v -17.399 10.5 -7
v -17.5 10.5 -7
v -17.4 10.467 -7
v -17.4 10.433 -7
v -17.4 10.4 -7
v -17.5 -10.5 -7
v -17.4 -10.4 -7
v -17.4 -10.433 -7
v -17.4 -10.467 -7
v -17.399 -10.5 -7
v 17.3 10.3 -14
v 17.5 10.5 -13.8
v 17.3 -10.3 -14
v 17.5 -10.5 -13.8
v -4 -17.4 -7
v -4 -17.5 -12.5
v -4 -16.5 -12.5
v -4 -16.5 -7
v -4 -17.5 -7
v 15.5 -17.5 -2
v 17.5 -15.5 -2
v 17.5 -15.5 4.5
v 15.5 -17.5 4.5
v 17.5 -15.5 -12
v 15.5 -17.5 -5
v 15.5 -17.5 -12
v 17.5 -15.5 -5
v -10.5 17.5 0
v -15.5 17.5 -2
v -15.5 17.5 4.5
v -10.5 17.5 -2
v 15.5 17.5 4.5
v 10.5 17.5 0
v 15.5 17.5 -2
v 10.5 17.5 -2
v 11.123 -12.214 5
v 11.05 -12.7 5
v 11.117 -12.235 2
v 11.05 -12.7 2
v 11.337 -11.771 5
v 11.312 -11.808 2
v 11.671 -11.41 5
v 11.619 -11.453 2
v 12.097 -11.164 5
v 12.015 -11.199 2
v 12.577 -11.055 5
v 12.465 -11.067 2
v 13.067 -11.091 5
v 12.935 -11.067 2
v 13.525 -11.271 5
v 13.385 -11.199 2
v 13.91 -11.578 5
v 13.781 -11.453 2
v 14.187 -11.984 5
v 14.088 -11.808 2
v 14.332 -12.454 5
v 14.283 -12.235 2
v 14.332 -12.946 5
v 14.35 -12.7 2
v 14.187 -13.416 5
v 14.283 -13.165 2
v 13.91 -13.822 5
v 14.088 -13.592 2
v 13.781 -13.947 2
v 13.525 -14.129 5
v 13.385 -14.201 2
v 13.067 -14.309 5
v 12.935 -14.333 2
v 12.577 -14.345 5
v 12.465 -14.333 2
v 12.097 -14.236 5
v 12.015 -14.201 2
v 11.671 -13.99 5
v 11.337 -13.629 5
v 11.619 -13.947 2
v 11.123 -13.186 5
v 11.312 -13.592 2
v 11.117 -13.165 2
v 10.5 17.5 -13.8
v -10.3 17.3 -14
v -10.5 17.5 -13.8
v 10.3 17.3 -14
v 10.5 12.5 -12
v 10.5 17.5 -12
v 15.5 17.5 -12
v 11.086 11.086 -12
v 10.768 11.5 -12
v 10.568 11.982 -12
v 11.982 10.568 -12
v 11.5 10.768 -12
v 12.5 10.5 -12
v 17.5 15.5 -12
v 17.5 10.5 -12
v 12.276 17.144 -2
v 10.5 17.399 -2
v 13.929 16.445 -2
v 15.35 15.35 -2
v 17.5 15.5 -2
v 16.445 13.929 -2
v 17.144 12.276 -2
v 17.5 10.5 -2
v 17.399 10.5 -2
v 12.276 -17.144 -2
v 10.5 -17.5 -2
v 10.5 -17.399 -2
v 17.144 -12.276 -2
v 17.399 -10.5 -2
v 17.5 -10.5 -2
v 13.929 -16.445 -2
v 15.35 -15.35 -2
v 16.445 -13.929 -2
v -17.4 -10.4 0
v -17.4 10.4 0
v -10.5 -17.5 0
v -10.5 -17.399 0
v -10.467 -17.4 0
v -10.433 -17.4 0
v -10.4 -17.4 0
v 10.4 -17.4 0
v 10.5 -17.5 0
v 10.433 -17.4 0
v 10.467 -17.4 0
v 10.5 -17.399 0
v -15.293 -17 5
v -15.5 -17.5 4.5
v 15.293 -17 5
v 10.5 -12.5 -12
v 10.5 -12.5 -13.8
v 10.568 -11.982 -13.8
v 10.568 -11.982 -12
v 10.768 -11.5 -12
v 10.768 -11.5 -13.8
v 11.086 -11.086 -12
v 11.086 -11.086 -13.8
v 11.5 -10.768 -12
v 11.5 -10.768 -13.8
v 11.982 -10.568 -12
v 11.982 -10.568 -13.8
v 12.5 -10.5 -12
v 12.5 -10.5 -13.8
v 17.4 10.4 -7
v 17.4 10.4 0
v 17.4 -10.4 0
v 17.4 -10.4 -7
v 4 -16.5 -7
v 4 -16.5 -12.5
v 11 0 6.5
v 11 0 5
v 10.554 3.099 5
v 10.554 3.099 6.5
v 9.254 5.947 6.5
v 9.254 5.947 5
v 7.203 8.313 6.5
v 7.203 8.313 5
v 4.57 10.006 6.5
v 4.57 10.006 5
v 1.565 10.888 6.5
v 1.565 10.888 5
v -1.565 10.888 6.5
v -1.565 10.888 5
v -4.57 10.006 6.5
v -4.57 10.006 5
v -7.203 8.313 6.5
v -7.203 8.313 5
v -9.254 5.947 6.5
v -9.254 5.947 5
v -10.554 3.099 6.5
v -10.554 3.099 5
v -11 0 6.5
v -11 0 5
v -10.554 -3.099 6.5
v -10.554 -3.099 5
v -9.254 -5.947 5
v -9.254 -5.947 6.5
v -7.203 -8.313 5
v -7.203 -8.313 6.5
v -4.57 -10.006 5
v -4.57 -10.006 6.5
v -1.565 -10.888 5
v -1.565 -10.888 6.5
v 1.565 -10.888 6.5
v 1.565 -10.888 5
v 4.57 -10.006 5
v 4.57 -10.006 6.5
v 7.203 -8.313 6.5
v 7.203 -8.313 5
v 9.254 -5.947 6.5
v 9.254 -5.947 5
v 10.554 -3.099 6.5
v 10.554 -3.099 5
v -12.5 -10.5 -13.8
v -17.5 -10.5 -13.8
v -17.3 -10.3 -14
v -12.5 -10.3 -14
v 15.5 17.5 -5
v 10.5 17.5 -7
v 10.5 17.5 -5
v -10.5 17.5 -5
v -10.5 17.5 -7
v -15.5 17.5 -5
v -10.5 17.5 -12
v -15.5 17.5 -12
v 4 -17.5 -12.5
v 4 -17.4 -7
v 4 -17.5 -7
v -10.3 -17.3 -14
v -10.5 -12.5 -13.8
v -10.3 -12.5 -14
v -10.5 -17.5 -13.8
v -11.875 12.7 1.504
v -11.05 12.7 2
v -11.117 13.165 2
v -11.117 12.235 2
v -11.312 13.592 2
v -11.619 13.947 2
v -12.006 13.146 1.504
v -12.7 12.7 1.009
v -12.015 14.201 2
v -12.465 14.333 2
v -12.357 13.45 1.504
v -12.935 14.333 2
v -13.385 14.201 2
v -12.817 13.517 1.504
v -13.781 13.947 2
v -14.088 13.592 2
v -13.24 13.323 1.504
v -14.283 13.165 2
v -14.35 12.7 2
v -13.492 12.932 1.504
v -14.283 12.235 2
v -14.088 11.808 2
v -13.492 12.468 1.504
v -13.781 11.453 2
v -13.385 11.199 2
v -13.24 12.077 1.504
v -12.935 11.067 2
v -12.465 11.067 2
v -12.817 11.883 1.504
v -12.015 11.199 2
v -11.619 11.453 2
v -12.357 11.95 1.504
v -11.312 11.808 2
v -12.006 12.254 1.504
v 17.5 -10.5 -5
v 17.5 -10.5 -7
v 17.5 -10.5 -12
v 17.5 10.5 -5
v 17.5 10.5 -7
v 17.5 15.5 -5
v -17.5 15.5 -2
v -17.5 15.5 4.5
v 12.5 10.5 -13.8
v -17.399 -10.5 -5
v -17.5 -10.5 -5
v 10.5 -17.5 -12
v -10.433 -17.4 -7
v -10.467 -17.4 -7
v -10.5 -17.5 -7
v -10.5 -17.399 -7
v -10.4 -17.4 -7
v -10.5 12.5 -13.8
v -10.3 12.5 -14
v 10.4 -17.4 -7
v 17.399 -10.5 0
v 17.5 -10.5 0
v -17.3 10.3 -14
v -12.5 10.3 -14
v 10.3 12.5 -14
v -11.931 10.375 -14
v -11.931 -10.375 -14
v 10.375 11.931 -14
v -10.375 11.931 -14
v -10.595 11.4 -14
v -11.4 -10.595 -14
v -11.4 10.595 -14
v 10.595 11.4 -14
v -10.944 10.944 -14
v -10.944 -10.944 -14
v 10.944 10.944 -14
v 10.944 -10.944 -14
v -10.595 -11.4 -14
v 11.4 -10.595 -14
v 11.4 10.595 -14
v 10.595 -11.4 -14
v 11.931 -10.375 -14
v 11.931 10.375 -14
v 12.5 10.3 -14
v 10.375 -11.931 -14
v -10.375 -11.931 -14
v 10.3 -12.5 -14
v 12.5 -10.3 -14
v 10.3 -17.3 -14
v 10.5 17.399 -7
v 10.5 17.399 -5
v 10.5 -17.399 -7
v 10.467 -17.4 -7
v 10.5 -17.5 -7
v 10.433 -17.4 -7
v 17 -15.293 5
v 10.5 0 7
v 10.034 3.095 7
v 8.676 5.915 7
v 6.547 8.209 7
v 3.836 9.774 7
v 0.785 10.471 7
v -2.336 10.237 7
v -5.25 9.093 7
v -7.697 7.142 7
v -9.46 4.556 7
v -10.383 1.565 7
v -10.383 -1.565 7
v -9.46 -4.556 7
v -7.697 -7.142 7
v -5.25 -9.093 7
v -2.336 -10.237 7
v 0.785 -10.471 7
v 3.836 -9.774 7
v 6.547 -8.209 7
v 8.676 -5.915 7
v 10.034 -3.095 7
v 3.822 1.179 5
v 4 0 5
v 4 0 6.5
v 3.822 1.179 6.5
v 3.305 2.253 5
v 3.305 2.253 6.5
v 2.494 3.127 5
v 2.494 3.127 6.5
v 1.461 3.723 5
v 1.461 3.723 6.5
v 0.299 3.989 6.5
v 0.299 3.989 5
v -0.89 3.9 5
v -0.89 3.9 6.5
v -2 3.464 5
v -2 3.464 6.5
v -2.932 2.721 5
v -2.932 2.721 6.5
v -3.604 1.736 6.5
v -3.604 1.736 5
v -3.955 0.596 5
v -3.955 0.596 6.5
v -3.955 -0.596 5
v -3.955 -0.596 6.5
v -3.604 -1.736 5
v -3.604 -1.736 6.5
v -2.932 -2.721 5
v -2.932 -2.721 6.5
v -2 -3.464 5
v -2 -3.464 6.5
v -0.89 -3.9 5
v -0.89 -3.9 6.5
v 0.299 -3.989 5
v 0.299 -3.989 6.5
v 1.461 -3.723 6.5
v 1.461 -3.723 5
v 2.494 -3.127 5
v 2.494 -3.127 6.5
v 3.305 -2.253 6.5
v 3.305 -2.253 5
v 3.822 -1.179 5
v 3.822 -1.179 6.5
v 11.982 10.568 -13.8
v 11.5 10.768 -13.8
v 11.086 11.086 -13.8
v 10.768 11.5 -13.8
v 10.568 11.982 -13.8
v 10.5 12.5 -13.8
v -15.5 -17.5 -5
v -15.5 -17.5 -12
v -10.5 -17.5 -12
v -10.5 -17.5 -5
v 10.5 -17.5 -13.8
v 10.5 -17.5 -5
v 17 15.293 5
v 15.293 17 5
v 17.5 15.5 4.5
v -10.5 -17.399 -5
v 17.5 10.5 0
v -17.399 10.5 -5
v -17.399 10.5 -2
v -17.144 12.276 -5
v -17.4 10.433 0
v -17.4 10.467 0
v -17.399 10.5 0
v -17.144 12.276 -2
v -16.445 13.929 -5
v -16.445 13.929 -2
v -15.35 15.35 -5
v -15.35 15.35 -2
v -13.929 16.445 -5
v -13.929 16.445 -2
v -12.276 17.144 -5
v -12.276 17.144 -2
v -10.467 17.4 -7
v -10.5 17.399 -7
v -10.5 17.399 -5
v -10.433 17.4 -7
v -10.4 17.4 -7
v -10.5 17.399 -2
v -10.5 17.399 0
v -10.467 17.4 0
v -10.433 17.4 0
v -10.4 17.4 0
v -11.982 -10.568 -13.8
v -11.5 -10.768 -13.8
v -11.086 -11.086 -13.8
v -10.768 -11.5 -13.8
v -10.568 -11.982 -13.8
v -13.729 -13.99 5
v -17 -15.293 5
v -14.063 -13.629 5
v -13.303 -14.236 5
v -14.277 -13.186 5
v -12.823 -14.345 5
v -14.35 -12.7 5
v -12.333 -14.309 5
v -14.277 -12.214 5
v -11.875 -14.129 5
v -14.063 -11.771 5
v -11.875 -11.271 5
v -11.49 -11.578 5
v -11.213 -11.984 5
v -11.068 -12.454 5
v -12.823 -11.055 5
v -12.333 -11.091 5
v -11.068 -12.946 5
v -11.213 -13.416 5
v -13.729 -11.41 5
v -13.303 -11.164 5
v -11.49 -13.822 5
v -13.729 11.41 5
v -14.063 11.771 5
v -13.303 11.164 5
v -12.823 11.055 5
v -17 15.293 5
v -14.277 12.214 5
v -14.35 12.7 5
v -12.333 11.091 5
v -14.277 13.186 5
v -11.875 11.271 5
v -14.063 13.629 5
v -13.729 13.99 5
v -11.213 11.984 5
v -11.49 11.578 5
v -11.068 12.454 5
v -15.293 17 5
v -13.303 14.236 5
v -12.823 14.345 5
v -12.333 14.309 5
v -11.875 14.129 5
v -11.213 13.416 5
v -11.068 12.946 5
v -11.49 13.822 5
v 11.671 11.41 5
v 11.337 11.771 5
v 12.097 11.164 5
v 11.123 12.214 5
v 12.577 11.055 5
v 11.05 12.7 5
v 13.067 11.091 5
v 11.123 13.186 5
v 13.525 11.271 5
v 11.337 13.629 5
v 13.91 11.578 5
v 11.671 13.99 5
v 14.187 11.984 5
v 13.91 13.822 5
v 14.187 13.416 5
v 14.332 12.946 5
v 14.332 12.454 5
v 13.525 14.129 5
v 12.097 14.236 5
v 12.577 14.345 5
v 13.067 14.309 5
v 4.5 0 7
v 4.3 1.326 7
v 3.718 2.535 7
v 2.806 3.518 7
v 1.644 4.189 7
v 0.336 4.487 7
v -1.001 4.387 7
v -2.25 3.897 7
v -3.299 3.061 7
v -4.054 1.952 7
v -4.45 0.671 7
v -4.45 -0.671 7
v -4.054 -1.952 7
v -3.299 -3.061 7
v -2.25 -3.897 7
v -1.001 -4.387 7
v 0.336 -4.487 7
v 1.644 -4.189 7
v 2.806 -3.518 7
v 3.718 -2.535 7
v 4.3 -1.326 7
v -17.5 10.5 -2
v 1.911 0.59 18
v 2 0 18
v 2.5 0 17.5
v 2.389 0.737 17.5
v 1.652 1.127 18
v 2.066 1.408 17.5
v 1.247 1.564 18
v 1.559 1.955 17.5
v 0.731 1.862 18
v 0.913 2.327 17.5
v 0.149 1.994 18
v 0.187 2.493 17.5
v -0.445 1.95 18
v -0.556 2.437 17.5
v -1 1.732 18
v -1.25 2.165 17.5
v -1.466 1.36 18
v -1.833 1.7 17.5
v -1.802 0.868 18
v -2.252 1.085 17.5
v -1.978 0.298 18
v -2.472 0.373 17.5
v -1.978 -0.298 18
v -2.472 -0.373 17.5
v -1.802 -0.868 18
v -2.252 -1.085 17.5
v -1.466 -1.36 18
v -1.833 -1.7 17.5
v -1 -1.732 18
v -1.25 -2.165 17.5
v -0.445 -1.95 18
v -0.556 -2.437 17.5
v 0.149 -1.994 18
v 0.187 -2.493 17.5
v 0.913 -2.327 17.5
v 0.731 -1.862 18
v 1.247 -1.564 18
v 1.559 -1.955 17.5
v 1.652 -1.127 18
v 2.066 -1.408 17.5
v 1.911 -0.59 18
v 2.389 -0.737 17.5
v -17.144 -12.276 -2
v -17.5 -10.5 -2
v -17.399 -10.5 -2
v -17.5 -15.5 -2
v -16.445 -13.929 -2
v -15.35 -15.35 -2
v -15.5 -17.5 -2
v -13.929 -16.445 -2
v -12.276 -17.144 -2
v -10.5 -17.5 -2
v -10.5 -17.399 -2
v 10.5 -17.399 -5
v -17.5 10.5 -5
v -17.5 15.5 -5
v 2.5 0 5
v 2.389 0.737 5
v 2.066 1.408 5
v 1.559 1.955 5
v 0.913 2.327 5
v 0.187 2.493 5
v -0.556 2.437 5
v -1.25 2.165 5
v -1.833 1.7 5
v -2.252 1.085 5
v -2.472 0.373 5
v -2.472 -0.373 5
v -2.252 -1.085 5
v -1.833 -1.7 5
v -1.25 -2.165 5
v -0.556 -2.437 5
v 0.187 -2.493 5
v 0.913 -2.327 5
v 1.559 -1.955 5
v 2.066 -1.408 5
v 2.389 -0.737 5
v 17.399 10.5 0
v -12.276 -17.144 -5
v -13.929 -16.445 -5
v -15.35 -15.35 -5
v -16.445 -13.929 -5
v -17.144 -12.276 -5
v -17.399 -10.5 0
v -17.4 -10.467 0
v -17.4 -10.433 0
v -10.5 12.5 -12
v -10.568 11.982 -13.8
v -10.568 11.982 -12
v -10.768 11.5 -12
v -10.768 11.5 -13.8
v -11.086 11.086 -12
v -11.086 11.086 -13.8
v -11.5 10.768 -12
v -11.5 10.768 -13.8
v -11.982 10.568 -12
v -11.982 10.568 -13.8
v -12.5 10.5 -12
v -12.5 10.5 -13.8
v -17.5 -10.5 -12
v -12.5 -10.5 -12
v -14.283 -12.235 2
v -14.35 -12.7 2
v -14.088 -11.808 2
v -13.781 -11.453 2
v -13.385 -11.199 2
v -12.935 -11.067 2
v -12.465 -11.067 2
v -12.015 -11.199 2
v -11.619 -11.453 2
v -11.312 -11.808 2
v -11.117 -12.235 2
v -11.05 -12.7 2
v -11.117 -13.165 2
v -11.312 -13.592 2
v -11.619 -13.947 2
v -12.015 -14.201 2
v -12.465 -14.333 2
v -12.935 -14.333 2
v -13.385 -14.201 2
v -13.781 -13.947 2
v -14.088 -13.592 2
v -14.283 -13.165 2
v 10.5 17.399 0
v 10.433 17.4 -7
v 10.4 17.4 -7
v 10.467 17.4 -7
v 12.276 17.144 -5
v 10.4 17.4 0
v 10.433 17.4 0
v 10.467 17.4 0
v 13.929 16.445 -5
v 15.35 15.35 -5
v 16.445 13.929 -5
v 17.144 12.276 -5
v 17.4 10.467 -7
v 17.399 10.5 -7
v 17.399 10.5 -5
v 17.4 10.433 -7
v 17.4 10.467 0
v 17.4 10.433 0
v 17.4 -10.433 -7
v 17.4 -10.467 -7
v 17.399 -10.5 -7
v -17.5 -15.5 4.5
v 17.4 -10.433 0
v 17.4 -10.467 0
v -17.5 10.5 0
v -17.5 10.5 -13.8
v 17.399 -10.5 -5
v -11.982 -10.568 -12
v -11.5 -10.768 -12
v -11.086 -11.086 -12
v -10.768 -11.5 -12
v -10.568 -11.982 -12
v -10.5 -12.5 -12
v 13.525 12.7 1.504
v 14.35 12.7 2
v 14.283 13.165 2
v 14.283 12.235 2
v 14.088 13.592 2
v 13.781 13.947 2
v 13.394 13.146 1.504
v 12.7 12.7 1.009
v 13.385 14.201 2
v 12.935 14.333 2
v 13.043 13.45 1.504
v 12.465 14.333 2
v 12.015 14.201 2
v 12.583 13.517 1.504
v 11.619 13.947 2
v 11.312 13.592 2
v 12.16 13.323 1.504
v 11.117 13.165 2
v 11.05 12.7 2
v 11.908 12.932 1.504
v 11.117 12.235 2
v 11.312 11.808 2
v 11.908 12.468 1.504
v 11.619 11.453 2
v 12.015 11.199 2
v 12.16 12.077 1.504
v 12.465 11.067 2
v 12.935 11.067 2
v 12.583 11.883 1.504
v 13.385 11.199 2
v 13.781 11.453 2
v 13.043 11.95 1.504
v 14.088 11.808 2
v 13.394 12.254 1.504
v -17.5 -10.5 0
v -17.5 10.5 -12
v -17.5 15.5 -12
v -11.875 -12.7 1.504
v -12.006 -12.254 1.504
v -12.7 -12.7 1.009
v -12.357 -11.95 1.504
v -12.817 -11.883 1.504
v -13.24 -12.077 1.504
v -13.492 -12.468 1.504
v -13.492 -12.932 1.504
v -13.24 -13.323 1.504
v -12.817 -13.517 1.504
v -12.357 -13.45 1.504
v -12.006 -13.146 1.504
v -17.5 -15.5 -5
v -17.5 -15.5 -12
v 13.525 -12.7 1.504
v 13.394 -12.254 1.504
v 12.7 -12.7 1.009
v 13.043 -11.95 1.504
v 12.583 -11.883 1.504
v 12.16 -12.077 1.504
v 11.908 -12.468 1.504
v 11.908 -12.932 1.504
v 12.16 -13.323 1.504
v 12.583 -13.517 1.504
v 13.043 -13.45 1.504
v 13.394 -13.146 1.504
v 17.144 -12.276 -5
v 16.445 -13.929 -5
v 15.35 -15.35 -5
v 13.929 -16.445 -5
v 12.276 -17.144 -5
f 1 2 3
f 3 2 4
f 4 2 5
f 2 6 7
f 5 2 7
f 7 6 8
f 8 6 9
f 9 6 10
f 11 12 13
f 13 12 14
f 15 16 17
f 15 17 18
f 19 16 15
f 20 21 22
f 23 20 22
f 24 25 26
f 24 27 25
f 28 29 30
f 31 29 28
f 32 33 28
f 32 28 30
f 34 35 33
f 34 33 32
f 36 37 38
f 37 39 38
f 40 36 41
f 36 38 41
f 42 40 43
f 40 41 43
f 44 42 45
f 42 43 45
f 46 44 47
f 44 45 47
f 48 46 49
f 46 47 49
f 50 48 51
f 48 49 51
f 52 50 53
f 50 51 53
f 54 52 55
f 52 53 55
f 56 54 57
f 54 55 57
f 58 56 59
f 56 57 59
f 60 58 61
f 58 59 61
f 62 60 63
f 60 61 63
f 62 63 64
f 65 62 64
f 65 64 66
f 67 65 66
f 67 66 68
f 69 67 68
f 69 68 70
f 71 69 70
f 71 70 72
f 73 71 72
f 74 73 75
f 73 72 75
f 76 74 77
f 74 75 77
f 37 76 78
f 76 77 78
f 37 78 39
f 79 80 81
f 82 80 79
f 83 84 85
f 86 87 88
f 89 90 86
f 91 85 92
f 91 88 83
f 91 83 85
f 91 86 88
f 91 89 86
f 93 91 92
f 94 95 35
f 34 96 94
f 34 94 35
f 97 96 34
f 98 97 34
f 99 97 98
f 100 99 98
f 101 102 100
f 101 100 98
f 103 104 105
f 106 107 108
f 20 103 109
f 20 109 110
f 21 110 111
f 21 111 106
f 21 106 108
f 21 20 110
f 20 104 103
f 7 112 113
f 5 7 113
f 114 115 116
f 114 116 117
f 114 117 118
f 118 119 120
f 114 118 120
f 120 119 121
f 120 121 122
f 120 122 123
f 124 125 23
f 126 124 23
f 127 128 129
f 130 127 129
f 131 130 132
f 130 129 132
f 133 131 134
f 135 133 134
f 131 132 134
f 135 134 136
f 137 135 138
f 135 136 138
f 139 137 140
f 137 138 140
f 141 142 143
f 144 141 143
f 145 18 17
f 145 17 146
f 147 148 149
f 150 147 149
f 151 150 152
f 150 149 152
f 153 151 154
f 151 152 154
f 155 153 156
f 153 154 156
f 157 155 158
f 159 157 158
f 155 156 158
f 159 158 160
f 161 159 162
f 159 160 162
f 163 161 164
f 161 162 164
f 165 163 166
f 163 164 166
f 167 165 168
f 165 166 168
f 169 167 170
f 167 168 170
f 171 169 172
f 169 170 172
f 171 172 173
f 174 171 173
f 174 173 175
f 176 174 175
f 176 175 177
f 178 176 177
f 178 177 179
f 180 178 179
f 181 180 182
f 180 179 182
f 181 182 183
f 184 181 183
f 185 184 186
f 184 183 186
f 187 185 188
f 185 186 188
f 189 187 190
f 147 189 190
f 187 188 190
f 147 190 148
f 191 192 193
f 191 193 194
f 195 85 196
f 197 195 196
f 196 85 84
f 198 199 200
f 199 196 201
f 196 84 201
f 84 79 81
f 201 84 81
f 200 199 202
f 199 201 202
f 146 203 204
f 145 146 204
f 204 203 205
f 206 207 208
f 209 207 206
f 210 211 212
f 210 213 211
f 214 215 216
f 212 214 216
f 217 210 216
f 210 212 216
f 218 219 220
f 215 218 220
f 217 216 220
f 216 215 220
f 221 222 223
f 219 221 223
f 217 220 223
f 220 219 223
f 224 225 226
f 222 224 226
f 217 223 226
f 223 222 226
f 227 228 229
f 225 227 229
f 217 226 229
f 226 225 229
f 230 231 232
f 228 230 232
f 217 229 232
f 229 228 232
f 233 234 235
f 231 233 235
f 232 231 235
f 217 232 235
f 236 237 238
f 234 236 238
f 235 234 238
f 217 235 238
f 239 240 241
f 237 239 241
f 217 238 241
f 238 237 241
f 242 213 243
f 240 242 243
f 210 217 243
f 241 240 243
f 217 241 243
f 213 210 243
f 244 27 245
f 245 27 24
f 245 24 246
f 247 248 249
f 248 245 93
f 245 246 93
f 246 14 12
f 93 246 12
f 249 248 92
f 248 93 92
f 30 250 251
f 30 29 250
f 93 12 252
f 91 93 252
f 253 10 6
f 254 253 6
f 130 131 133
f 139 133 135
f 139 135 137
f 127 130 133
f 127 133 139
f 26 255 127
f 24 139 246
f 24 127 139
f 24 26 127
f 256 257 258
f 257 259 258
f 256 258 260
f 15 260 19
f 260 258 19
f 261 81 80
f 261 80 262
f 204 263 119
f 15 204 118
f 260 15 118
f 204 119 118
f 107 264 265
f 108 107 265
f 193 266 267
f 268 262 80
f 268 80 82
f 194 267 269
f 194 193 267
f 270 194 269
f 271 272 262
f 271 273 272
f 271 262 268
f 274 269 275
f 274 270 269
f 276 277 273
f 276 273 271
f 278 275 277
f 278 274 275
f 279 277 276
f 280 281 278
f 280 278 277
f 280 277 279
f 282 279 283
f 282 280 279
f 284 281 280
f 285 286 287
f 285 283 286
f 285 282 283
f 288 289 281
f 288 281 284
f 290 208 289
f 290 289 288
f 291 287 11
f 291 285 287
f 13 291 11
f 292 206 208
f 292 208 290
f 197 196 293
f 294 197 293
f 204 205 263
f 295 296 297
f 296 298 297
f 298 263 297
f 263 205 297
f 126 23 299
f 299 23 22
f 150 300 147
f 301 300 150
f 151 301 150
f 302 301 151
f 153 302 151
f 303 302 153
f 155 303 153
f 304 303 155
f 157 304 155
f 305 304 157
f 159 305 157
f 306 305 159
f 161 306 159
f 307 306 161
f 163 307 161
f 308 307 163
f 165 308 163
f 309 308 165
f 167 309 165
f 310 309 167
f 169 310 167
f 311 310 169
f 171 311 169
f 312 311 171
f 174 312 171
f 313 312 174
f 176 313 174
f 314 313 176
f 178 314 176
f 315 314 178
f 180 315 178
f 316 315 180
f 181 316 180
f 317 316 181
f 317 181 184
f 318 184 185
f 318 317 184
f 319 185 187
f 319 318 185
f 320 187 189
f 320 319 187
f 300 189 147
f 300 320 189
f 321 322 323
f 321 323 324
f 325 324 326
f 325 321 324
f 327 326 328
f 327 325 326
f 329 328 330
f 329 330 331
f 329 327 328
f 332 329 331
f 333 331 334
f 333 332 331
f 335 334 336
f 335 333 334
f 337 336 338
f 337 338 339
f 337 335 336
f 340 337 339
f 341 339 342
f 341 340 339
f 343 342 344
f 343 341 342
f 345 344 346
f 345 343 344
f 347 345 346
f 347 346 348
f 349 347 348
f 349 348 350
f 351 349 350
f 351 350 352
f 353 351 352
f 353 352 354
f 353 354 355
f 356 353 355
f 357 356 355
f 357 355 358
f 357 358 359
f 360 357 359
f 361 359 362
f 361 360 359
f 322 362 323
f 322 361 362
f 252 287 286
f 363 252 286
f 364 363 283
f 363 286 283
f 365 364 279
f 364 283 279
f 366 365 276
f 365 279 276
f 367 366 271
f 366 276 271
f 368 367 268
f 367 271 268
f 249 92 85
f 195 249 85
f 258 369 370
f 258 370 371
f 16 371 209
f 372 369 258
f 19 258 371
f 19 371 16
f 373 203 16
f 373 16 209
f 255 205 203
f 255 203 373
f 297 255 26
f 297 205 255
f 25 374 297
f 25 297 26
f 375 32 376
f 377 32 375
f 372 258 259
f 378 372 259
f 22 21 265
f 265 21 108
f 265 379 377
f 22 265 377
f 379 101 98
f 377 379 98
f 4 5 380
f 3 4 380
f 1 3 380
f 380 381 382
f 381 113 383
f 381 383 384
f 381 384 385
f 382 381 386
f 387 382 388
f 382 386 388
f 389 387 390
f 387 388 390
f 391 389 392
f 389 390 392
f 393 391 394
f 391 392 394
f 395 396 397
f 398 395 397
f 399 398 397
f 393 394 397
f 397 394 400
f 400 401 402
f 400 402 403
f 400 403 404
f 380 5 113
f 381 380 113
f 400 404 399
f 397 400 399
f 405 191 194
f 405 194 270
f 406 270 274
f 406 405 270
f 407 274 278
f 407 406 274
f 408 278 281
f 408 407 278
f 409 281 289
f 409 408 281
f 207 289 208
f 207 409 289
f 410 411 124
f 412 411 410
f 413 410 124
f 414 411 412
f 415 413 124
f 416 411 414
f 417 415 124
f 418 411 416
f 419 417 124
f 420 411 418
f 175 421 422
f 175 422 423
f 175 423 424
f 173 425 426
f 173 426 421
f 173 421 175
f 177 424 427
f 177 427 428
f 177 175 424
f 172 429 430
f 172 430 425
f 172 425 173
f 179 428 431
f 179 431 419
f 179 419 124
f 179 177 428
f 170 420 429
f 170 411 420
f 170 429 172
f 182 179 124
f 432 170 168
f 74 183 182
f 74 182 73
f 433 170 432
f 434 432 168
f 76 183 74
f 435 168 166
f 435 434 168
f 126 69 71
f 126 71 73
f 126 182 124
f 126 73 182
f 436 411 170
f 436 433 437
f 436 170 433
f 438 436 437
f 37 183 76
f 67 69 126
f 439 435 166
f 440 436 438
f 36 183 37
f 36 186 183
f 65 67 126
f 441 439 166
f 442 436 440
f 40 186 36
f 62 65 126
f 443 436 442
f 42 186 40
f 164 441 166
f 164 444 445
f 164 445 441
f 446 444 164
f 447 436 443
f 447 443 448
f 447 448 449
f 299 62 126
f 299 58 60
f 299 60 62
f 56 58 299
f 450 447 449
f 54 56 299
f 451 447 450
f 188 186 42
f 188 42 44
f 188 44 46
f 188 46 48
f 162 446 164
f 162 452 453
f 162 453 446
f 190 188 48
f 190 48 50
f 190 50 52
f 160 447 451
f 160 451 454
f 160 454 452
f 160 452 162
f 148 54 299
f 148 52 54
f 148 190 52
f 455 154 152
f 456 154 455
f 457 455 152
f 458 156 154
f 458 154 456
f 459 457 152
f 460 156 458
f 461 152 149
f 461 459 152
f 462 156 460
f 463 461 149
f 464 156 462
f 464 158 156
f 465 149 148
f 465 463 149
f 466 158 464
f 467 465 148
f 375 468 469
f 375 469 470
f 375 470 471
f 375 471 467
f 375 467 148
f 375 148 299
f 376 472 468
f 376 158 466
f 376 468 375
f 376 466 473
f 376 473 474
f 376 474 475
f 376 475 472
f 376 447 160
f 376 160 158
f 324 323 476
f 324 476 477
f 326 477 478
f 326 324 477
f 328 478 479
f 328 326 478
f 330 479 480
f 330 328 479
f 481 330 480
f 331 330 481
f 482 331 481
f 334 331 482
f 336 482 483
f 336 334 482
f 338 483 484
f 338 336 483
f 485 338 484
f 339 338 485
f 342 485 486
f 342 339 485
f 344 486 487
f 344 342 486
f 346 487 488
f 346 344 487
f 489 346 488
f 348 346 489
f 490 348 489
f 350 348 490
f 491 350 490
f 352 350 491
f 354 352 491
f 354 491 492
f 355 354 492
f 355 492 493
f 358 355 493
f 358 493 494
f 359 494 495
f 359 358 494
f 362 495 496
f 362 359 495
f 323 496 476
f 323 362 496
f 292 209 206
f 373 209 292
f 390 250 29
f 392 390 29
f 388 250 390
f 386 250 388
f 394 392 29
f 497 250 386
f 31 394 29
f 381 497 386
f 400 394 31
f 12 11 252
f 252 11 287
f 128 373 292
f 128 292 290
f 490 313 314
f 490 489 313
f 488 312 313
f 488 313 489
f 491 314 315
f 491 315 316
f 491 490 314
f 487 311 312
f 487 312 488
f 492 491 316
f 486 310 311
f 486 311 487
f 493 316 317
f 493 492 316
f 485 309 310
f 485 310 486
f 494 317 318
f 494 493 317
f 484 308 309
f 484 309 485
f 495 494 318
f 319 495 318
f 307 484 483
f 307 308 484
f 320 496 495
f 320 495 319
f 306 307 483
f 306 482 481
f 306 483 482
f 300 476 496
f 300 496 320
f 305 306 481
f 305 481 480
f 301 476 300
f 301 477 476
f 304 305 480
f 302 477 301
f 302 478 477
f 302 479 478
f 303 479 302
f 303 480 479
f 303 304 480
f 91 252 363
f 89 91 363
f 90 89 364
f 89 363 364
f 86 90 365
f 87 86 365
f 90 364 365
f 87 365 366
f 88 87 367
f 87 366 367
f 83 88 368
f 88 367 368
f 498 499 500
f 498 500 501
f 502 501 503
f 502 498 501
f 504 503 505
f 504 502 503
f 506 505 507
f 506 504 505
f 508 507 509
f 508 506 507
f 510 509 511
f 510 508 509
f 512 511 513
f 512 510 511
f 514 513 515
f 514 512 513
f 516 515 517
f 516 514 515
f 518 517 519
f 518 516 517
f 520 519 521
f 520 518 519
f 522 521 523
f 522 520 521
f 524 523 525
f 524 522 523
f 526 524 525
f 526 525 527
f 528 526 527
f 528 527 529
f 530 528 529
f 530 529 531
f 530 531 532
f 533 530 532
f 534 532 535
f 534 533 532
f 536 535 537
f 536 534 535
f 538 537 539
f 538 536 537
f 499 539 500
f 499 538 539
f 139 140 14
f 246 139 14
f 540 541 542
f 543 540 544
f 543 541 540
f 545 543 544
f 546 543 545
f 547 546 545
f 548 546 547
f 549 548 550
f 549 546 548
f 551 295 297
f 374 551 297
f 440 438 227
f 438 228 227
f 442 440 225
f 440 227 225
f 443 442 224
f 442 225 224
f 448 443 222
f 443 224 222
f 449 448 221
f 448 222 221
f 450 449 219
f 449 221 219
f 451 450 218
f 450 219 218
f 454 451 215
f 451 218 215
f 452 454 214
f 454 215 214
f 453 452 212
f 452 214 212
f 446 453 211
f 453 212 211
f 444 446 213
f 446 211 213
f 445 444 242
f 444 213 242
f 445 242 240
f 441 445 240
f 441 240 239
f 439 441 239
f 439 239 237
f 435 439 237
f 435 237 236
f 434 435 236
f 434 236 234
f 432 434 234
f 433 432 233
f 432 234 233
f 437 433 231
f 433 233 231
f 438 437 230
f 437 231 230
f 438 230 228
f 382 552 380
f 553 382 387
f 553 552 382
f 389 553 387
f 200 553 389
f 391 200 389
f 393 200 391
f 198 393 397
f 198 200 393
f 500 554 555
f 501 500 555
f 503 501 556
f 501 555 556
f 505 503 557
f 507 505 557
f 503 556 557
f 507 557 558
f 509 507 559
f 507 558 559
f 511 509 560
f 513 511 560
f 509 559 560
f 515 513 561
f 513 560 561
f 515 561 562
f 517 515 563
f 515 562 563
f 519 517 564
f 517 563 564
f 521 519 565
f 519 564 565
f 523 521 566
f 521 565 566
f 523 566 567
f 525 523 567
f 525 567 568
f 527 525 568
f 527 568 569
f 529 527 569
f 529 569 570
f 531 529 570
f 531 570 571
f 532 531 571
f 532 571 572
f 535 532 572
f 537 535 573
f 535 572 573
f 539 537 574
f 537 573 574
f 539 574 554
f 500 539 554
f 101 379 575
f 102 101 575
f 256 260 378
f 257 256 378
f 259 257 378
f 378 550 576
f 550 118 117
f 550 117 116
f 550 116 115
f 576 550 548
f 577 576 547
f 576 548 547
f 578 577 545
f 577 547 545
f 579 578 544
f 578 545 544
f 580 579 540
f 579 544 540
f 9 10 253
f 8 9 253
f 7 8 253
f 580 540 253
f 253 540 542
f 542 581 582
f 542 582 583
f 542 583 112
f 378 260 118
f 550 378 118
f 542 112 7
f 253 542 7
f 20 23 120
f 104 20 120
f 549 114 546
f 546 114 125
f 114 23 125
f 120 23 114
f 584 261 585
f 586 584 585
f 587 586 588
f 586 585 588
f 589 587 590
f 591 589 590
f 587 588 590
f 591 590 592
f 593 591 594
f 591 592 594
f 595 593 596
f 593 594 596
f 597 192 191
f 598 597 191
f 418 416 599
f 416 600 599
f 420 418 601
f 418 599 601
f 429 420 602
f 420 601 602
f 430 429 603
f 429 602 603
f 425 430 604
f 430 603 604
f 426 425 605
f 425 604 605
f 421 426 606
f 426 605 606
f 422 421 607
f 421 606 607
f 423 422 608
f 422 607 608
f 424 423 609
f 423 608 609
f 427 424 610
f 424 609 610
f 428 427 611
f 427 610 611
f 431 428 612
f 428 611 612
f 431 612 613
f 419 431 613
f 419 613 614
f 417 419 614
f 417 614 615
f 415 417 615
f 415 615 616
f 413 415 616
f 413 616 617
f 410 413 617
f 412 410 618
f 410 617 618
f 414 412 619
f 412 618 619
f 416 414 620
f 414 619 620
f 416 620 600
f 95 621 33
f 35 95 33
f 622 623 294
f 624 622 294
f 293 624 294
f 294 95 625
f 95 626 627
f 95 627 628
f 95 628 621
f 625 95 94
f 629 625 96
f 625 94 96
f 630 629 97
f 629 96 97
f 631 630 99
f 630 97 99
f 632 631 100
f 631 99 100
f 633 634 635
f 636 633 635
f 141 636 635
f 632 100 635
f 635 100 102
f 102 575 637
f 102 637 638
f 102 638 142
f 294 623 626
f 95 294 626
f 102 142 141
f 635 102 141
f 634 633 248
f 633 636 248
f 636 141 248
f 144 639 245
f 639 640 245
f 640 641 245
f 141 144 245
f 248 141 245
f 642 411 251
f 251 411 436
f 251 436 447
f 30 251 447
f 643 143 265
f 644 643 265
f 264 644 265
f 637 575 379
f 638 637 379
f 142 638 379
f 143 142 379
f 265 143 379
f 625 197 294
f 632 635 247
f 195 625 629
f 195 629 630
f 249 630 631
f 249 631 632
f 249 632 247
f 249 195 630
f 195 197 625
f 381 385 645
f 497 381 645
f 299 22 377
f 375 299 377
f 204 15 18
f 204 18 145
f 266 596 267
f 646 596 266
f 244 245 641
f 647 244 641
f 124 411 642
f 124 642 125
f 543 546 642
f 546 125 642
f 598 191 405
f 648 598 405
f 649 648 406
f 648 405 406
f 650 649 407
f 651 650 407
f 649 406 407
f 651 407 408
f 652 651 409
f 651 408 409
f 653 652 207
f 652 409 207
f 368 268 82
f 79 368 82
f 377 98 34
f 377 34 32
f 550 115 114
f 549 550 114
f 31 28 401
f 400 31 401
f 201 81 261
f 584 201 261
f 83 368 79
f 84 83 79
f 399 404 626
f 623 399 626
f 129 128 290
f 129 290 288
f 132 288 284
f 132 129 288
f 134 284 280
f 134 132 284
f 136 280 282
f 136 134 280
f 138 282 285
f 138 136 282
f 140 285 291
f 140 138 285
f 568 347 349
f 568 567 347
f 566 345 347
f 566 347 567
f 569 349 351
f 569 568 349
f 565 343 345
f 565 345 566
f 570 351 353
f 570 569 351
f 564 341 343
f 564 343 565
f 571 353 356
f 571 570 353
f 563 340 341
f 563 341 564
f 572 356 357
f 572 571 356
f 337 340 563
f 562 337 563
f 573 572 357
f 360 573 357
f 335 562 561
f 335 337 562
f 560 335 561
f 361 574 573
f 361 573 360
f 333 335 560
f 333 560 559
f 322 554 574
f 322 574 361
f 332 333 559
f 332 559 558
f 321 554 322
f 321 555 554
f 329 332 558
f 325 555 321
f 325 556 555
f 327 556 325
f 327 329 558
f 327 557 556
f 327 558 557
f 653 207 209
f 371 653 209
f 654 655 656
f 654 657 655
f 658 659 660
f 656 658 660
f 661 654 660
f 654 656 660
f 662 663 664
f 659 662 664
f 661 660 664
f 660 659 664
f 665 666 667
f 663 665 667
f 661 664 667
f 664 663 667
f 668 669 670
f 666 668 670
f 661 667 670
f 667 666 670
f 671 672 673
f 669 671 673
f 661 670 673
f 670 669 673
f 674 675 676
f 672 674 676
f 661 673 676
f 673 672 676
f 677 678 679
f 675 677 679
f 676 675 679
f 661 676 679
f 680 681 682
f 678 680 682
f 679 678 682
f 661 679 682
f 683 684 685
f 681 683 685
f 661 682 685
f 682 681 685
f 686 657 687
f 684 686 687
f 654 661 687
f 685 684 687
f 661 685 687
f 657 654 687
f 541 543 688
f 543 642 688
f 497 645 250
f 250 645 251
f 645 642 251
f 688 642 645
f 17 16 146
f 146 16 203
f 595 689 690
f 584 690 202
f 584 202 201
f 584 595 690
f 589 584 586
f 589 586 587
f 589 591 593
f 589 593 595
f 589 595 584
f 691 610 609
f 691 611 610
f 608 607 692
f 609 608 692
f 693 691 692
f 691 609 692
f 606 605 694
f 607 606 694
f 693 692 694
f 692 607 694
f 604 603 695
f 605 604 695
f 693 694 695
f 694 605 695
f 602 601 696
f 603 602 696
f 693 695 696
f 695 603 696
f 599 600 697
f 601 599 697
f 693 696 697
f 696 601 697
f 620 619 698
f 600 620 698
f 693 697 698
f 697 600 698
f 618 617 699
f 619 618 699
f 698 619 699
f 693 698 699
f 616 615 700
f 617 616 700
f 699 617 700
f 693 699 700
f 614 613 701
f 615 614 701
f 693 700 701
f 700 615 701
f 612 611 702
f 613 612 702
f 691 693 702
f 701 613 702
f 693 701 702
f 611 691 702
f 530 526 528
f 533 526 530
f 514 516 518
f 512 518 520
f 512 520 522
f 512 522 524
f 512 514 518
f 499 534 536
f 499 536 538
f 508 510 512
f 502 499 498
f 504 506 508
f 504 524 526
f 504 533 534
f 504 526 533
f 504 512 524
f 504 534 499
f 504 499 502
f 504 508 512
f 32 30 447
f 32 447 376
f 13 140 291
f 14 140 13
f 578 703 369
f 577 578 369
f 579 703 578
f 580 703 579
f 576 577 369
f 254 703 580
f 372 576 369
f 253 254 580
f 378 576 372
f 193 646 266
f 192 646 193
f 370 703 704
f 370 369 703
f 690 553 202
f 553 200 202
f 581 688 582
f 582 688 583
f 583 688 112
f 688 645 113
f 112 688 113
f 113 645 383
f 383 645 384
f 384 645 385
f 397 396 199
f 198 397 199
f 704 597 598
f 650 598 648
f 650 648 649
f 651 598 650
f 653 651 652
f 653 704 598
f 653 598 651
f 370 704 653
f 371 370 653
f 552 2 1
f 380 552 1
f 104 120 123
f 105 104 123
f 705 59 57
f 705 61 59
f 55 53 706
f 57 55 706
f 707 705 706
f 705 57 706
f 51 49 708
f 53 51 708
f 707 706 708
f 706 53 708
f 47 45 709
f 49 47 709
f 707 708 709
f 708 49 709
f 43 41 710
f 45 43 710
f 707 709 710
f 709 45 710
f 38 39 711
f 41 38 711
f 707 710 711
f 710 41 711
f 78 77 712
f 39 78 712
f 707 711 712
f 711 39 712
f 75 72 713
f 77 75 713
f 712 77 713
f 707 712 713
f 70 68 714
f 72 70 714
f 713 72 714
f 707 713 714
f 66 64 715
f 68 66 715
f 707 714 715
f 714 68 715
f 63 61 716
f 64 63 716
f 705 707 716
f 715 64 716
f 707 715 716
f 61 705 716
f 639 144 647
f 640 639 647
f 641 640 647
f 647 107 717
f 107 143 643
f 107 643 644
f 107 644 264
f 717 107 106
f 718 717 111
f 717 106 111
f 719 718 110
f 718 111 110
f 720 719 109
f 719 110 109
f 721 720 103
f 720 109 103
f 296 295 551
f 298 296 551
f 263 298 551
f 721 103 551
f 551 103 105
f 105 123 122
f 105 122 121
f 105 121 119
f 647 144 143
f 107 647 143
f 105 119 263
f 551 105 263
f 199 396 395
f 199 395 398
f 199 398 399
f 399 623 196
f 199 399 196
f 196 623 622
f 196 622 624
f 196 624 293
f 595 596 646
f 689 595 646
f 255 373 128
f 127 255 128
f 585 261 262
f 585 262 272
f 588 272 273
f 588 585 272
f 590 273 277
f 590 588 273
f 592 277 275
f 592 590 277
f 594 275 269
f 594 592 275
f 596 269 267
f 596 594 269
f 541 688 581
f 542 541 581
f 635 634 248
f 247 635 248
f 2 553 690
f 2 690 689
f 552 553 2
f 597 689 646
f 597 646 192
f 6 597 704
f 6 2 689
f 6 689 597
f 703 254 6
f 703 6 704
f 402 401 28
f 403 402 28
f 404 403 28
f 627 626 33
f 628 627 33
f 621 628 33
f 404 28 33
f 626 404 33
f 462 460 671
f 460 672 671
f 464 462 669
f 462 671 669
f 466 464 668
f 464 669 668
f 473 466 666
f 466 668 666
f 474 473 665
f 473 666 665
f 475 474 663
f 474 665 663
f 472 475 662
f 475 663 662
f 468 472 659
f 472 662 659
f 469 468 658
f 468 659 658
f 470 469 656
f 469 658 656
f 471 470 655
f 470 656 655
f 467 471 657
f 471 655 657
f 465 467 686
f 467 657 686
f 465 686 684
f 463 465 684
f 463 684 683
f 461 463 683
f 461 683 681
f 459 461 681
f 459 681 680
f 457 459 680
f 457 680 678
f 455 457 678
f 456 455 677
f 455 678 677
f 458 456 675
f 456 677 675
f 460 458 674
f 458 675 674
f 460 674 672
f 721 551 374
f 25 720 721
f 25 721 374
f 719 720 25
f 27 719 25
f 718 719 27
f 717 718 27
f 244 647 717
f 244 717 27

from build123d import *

# Parameters (mm, degrees)
F0_W      = 35
F0_H      = 35
F1_DEPTH  = 5
F2_R      = 11
F2_R_2    = 4
F3_DEPTH  = 2
F4_SIZE   = 2
F5_R      = 2.5
F6_DEPTH  = 13
F8_D      = 3.3
F8_DEPTH  = 3
F8_TIP    = 0.9914200214
F9_SIZE   = 0.5
F11_DEPTH = 7
F13_DEPTH = 2
F14_W     = 35
F14_H     = 35
F15_DEPTH = 7
F16_SIZE  = 2
F18_DEPTH = 2
F19_W     = 8
F19_H     = 5.5
F20_DEPTH = 1
F22_DEPTH = 2
F23_SIZE  = 0.2


with BuildPart() as f1:
    # F0 (on Top) → F1 (new body)
    with BuildSketch(Plane.XY):
        Rectangle(F0_W, F0_H)
    extrude(amount=F1_DEPTH)

    # F2 (on face) → F3 (join)
    with BuildSketch(Plane.XY.offset(5)):
        Circle(F2_R)
        Circle(F2_R_2, mode=Mode.SUBTRACT)
    extrude(amount=F3_DEPTH)

    # F4
    f4_edges = [f1.edges().sort_by_distance(p)[0] for p in [
        (-17.5, 17.5, 2.5),
        (-17.5, -17.5, 2.5),
        (17.5, -17.5, 2.5),
        (17.5, 17.5, 2.5),
    ]]
    chamfer(f4_edges, length=F4_SIZE)

    # F5 (on face) → F6 (join)
    with BuildSketch(Plane.XY.offset(5)):
        Circle(F5_R)
    extrude(amount=F6_DEPTH)

    # F8
    with Locations(Plane.XY.offset(5)):
        with Locations((-12.7, -12.7), (-12.7, 12.7), (12.7, 12.7), (12.7, -12.7)):
            Hole(F8_D / 2, depth=F8_DEPTH)
            with Locations((0, 0, -(F8_DEPTH + F8_TIP / 2))):  # 118° drill point
                Cone(0, F8_D / 2, F8_TIP, mode=Mode.SUBTRACT)

    # F9
    f9_edges = [f1.edges().sort_by_distance(p)[0] for p in [
        (0, -17.5, 5),
        (-17.5, 0, 5),
        (0, 17.5, 5),
        (17.5, 0, 5),
        (16.5, -16.5, 5),
        (16.5, 16.5, 5),
        (-16.5, 16.5, 5),
        (-16.5, -16.5, 5),
        (-11, 0, 7),
        (-4, 0, 7),
        (-2.5, 0, 18),
    ]]
    chamfer(f9_edges, length=F9_SIZE)

    # F10 (on face) → F11 (join)
    with BuildSketch(Plane(origin=(0, 0, 0), x_dir=(1, 0, 0), z_dir=(0, 0, -1))):
        with BuildLine():
            Line((10.4, 17.4), (-10.4, 17.4))
            ThreePointArc((-10.4, 17.4), (-15.3497474683, 15.3497474683), (-17.4, 10.4))
            Line((-17.4, 10.4), (-17.4, -10.4))
            ThreePointArc((-17.4, -10.4), (-15.3497474683, -15.3497474683), (-10.4, -17.4))
            Line((-10.4, -17.4), (10.4, -17.4))
            ThreePointArc((10.4, -17.4), (15.3497474683, -15.3497474683), (17.4, -10.4))
            Line((17.4, -10.4), (17.4, 10.4))
            ThreePointArc((17.4, 10.4), (15.3497474683, 15.3497474683), (10.4, 17.4))
        make_face()
    extrude(amount=F11_DEPTH)

    # F12 (on face) → F13 (join)
    with BuildSketch(Plane(origin=(0, 0, 0), x_dir=(1, 0, 0), z_dir=(0, 0, -1))):
        with BuildLine():
            Line((-10.5, 17.5), (-15.5, 17.5))
            Line((-15.5, 17.5), (-17.5, 15.5))
            Line((-17.5, 15.5), (-17.5, 10.5))
            Line((-17.5, 10.5), (-17.3992856778, 10.5))
            ThreePointArc((-17.3992856778, 10.5), (-15.3497474683, 15.3497474683), (-10.5, 17.3992856778))
            Line((-10.5, 17.3992856778), (-10.5, 17.5))
        make_face()
        with BuildLine():
            Line((15.5, 17.5), (10.5, 17.5))
            Line((10.5, 17.5), (10.5, 17.3992856778))
            ThreePointArc((10.5, 17.3992856778), (15.3497474683, 15.3497474683), (17.3992856778, 10.5))
            Line((17.3992856778, 10.5), (17.5, 10.5))
            Line((17.5, 10.5), (17.5, 15.5))
            Line((17.5, 15.5), (15.5, 17.5))
        make_face()
        with BuildLine():
            Line((17.5, -15.5), (17.5, -10.5))
            Line((17.5, -10.5), (17.3992856778, -10.5))
            ThreePointArc((17.3992856778, -10.5), (15.3497474683, -15.3497474683), (10.5, -17.3992856778))
            Line((10.5, -17.3992856778), (10.5, -17.5))
            Line((10.5, -17.5), (15.5, -17.5))
            Line((15.5, -17.5), (17.5, -15.5))
        make_face()
        with BuildLine():
            Line((-17.3992856778, -10.5), (-17.5, -10.5))
            Line((-17.5, -10.5), (-17.5, -15.5))
            Line((-17.5, -15.5), (-15.5, -17.5))
            Line((-15.5, -17.5), (-10.5, -17.5))
            Line((-10.5, -17.5), (-10.5, -17.3992856778))
            ThreePointArc((-10.5, -17.3992856778), (-15.3497474683, -15.3497474683), (-17.3992856778, -10.5))
        make_face()
    extrude(amount=F13_DEPTH)

    # F14 (on face) → F15 (join)
    with BuildSketch(Plane(origin=(0, 0, -7), x_dir=(1, 0, 0), z_dir=(0, 0, -1))):
        Rectangle(F14_W, F14_H)
        with BuildLine():
            Line((-10.4, 17.4), (10.4, 17.4))
            ThreePointArc((10.4, 17.4), (15.3497474683, 15.3497474683), (17.4, 10.4))
            Line((17.4, 10.4), (17.4, -10.4))
            ThreePointArc((17.4, -10.4), (15.3497474683, -15.3497474683), (10.4, -17.4))
            Line((10.4, -17.4), (-10.4, -17.4))
            ThreePointArc((-10.4, -17.4), (-15.3497474683, -15.3497474683), (-17.4, -10.4))
            Line((-17.4, -10.4), (-17.4, 10.4))
            ThreePointArc((-17.4, 10.4), (-15.3497474683, 15.3497474683), (-10.4, 17.4))
        make_face(mode=Mode.SUBTRACT)
        with BuildLine():
            ThreePointArc((17.4, 10.4), (15.3497474683, 15.3497474683), (10.4, 17.4))
            Line((10.4, 17.4), (-10.4, 17.4))
            ThreePointArc((-10.4, 17.4), (-15.3497474683, 15.3497474683), (-17.4, 10.4))
            Line((-17.4, 10.4), (-17.4, -10.4))
            ThreePointArc((-17.4, -10.4), (-15.3497474683, -15.3497474683), (-10.4, -17.4))
            Line((-10.4, -17.4), (10.4, -17.4))
            ThreePointArc((10.4, -17.4), (15.3497474683, -15.3497474683), (17.4, -10.4))
            Line((17.4, -10.4), (17.4, 10.4))
        make_face()
    extrude(amount=F15_DEPTH)

    # F16
    f16_edges = [f1.edges().sort_by_distance(p)[0] for p in [
        (-17.5, -17.5, -10.5),
        (17.5, -17.5, -10.5),
        (17.5, 17.5, -10.5),
        (-17.5, 17.5, -10.5),
    ]]
    chamfer(f16_edges, length=F16_SIZE)

    # F17 (on face) → F18 (join)
    with BuildSketch(Plane.XY.offset(-7)):
        with BuildLine():
            Line((15.5, 17.5), (10.5, 17.5))
            Line((10.5, 17.5), (10.5, 17.3992856778))
            ThreePointArc((10.5, 17.3992856778), (15.3497474683, 15.3497474683), (17.3992856778, 10.5))
            Line((17.3992856778, 10.5), (17.5, 10.5))
            Line((17.5, 10.5), (17.5, 15.5))
            Line((17.5, 15.5), (15.5, 17.5))
        make_face()
        with BuildLine():
            Line((-10.5, 17.5), (-15.5, 17.5))
            Line((-15.5, 17.5), (-17.5, 15.5))
            Line((-17.5, 15.5), (-17.5, 10.5))
            Line((-17.5, 10.5), (-17.3992856778, 10.5))
            ThreePointArc((-17.3992856778, 10.5), (-15.3497474683, 15.3497474683), (-10.5, 17.3992856778))
            Line((-10.5, 17.3992856778), (-10.5, 17.5))
        make_face()
        with BuildLine():
            Line((-17.3992856778, -10.5), (-17.5, -10.5))
            Line((-17.5, -10.5), (-17.5, -15.5))
            Line((-17.5, -15.5), (-15.5, -17.5))
            Line((-15.5, -17.5), (-10.5, -17.5))
            Line((-10.5, -17.5), (-10.5, -17.3992856778))
            ThreePointArc((-10.5, -17.3992856778), (-15.3497474683, -15.3497474683), (-17.3992856778, -10.5))
        make_face()
        with BuildLine():
            Line((17.5, -15.5), (17.5, -10.5))
            Line((17.5, -10.5), (17.3992856778, -10.5))
            ThreePointArc((17.3992856778, -10.5), (15.3497474683, -15.3497474683), (10.5, -17.3992856778))
            Line((10.5, -17.3992856778), (10.5, -17.5))
            Line((10.5, -17.5), (15.5, -17.5))
            Line((15.5, -17.5), (17.5, -15.5))
        make_face()
    extrude(amount=F18_DEPTH)

    # F19 (on face) → F20 (cut)
    with BuildSketch(Plane.XZ.offset(17.5)):
        with Locations((0, -9.75)):
            Rectangle(F19_W, F19_H)
    extrude(amount=-F20_DEPTH, mode=Mode.SUBTRACT)

    # F21 (on face) → F22 (cut)
    with BuildSketch(Plane(origin=(0, 0, -14), x_dir=(1, 0, 0), z_dir=(0, 0, -1))):
        with BuildLine():
            Line((-17.5, 15.5), (-17.5, 10.5))
            Line((-17.5, 10.5), (-12.5, 10.5))
            ThreePointArc((-12.5, 10.5), (-11.0857864376, 11.0857864376), (-10.5, 12.5))
            Line((-10.5, 12.5), (-10.5, 17.5))
            Line((-10.5, 17.5), (-15.5, 17.5))
            Line((-15.5, 17.5), (-17.5, 15.5))
        make_face()
        with BuildLine():
            Line((15.5, 17.5), (10.5, 17.5))
            Line((10.5, 17.5), (10.5, 12.5))
            ThreePointArc((10.5, 12.5), (11.0857864376, 11.0857864376), (12.5, 10.5))
            Line((12.5, 10.5), (17.5, 10.5))
            Line((17.5, 10.5), (17.5, 15.5))
            Line((17.5, 15.5), (15.5, 17.5))
        make_face()
        with BuildLine():
            Line((10.5, -12.5), (10.5, -17.5))
            Line((10.5, -17.5), (15.5, -17.5))
            Line((15.5, -17.5), (17.5, -15.5))
            Line((17.5, -15.5), (17.5, -10.5))
            Line((17.5, -10.5), (12.5, -10.5))
            ThreePointArc((12.5, -10.5), (11.0857864376, -11.0857864376), (10.5, -12.5))
        make_face()
        with BuildLine():
            Line((-12.5, -10.5), (-17.5, -10.5))
            Line((-17.5, -10.5), (-17.5, -15.5))
            Line((-17.5, -15.5), (-15.5, -17.5))
            Line((-15.5, -17.5), (-10.5, -17.5))
            Line((-10.5, -17.5), (-10.5, -12.5))
            ThreePointArc((-10.5, -12.5), (-11.0857864376, -11.0857864376), (-12.5, -10.5))
        make_face()
    extrude(amount=-F22_DEPTH, mode=Mode.SUBTRACT)

    # F23
    f23_edges = [f1.edges().sort_by_distance(p)[0] for p in [
        (17.5, 0, -14),
        (0, -17.5, -14),
        (-17.5, 0, -14),
        (0, 17.5, -14),
        (10.5, 15, -14),
        (11.085786, 11.085786, -14),
        (15, 10.5, -14),
        (15, -10.5, -14),
        (11.085786, -11.085786, -14),
        (10.5, -15, -14),
        (-10.5, -15, -14),
        (-11.085786, -11.085786, -14),
        (-15, -10.5, -14),
        (-15, 10.5, -14),
        (-11.085786, 11.085786, -14),
        (-10.5, 15, -14),
    ]]
    chamfer(f23_edges, length=F23_SIZE)


solid = f1.part
